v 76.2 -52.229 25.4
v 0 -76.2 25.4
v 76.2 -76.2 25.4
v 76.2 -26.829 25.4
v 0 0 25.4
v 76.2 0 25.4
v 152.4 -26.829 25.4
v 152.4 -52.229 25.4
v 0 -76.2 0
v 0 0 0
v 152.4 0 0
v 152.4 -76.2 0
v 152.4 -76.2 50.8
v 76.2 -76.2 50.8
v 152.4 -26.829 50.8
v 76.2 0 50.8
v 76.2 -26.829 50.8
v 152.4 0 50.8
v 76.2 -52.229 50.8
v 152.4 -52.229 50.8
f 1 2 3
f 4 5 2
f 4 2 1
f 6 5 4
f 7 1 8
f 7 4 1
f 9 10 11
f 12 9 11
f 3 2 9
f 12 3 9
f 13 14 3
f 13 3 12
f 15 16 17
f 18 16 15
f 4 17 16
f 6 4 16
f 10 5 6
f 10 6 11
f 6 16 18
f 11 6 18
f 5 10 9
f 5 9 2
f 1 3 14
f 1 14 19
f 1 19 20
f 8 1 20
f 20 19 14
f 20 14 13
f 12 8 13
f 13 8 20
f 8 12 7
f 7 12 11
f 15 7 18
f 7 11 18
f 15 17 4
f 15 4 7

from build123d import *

# Parameters (mm, degrees)
F0_W     = 152.4
F0_H     = 50.8
F1_DEPTH = 76.2
F2_W     = 76.2
F2_H     = 25.4
F3_DEPTH = 25.4
F5_DEPTH = 25.4


with BuildPart() as f1:
    # F0 (on Front) → F1 (new body)
    with BuildSketch(Plane.XZ):
        with Locations((76.2, 25.4)):
            Rectangle(F0_W, F0_H)
    extrude(amount=F1_DEPTH)

    # F2 (on face) → F3 (cut)
    with BuildSketch(Plane.XY.offset(50.8)):
        with Locations((114.3, -39.528749)):
            Rectangle(F2_W, F2_H)
    extrude(amount=-F3_DEPTH, mode=Mode.SUBTRACT)

    # F4 (on face) → F5 (cut)
    with BuildSketch(Plane.XY.offset(50.8)):
        Polygon((76.2, -26.828749), (76.2, 0), (0, 0), (0, -76.2), (76.2, -76.2), (76.2, -52.228749), align=None)
    extrude(amount=-F5_DEPTH, mode=Mode.SUBTRACT)


solid = f1.part
